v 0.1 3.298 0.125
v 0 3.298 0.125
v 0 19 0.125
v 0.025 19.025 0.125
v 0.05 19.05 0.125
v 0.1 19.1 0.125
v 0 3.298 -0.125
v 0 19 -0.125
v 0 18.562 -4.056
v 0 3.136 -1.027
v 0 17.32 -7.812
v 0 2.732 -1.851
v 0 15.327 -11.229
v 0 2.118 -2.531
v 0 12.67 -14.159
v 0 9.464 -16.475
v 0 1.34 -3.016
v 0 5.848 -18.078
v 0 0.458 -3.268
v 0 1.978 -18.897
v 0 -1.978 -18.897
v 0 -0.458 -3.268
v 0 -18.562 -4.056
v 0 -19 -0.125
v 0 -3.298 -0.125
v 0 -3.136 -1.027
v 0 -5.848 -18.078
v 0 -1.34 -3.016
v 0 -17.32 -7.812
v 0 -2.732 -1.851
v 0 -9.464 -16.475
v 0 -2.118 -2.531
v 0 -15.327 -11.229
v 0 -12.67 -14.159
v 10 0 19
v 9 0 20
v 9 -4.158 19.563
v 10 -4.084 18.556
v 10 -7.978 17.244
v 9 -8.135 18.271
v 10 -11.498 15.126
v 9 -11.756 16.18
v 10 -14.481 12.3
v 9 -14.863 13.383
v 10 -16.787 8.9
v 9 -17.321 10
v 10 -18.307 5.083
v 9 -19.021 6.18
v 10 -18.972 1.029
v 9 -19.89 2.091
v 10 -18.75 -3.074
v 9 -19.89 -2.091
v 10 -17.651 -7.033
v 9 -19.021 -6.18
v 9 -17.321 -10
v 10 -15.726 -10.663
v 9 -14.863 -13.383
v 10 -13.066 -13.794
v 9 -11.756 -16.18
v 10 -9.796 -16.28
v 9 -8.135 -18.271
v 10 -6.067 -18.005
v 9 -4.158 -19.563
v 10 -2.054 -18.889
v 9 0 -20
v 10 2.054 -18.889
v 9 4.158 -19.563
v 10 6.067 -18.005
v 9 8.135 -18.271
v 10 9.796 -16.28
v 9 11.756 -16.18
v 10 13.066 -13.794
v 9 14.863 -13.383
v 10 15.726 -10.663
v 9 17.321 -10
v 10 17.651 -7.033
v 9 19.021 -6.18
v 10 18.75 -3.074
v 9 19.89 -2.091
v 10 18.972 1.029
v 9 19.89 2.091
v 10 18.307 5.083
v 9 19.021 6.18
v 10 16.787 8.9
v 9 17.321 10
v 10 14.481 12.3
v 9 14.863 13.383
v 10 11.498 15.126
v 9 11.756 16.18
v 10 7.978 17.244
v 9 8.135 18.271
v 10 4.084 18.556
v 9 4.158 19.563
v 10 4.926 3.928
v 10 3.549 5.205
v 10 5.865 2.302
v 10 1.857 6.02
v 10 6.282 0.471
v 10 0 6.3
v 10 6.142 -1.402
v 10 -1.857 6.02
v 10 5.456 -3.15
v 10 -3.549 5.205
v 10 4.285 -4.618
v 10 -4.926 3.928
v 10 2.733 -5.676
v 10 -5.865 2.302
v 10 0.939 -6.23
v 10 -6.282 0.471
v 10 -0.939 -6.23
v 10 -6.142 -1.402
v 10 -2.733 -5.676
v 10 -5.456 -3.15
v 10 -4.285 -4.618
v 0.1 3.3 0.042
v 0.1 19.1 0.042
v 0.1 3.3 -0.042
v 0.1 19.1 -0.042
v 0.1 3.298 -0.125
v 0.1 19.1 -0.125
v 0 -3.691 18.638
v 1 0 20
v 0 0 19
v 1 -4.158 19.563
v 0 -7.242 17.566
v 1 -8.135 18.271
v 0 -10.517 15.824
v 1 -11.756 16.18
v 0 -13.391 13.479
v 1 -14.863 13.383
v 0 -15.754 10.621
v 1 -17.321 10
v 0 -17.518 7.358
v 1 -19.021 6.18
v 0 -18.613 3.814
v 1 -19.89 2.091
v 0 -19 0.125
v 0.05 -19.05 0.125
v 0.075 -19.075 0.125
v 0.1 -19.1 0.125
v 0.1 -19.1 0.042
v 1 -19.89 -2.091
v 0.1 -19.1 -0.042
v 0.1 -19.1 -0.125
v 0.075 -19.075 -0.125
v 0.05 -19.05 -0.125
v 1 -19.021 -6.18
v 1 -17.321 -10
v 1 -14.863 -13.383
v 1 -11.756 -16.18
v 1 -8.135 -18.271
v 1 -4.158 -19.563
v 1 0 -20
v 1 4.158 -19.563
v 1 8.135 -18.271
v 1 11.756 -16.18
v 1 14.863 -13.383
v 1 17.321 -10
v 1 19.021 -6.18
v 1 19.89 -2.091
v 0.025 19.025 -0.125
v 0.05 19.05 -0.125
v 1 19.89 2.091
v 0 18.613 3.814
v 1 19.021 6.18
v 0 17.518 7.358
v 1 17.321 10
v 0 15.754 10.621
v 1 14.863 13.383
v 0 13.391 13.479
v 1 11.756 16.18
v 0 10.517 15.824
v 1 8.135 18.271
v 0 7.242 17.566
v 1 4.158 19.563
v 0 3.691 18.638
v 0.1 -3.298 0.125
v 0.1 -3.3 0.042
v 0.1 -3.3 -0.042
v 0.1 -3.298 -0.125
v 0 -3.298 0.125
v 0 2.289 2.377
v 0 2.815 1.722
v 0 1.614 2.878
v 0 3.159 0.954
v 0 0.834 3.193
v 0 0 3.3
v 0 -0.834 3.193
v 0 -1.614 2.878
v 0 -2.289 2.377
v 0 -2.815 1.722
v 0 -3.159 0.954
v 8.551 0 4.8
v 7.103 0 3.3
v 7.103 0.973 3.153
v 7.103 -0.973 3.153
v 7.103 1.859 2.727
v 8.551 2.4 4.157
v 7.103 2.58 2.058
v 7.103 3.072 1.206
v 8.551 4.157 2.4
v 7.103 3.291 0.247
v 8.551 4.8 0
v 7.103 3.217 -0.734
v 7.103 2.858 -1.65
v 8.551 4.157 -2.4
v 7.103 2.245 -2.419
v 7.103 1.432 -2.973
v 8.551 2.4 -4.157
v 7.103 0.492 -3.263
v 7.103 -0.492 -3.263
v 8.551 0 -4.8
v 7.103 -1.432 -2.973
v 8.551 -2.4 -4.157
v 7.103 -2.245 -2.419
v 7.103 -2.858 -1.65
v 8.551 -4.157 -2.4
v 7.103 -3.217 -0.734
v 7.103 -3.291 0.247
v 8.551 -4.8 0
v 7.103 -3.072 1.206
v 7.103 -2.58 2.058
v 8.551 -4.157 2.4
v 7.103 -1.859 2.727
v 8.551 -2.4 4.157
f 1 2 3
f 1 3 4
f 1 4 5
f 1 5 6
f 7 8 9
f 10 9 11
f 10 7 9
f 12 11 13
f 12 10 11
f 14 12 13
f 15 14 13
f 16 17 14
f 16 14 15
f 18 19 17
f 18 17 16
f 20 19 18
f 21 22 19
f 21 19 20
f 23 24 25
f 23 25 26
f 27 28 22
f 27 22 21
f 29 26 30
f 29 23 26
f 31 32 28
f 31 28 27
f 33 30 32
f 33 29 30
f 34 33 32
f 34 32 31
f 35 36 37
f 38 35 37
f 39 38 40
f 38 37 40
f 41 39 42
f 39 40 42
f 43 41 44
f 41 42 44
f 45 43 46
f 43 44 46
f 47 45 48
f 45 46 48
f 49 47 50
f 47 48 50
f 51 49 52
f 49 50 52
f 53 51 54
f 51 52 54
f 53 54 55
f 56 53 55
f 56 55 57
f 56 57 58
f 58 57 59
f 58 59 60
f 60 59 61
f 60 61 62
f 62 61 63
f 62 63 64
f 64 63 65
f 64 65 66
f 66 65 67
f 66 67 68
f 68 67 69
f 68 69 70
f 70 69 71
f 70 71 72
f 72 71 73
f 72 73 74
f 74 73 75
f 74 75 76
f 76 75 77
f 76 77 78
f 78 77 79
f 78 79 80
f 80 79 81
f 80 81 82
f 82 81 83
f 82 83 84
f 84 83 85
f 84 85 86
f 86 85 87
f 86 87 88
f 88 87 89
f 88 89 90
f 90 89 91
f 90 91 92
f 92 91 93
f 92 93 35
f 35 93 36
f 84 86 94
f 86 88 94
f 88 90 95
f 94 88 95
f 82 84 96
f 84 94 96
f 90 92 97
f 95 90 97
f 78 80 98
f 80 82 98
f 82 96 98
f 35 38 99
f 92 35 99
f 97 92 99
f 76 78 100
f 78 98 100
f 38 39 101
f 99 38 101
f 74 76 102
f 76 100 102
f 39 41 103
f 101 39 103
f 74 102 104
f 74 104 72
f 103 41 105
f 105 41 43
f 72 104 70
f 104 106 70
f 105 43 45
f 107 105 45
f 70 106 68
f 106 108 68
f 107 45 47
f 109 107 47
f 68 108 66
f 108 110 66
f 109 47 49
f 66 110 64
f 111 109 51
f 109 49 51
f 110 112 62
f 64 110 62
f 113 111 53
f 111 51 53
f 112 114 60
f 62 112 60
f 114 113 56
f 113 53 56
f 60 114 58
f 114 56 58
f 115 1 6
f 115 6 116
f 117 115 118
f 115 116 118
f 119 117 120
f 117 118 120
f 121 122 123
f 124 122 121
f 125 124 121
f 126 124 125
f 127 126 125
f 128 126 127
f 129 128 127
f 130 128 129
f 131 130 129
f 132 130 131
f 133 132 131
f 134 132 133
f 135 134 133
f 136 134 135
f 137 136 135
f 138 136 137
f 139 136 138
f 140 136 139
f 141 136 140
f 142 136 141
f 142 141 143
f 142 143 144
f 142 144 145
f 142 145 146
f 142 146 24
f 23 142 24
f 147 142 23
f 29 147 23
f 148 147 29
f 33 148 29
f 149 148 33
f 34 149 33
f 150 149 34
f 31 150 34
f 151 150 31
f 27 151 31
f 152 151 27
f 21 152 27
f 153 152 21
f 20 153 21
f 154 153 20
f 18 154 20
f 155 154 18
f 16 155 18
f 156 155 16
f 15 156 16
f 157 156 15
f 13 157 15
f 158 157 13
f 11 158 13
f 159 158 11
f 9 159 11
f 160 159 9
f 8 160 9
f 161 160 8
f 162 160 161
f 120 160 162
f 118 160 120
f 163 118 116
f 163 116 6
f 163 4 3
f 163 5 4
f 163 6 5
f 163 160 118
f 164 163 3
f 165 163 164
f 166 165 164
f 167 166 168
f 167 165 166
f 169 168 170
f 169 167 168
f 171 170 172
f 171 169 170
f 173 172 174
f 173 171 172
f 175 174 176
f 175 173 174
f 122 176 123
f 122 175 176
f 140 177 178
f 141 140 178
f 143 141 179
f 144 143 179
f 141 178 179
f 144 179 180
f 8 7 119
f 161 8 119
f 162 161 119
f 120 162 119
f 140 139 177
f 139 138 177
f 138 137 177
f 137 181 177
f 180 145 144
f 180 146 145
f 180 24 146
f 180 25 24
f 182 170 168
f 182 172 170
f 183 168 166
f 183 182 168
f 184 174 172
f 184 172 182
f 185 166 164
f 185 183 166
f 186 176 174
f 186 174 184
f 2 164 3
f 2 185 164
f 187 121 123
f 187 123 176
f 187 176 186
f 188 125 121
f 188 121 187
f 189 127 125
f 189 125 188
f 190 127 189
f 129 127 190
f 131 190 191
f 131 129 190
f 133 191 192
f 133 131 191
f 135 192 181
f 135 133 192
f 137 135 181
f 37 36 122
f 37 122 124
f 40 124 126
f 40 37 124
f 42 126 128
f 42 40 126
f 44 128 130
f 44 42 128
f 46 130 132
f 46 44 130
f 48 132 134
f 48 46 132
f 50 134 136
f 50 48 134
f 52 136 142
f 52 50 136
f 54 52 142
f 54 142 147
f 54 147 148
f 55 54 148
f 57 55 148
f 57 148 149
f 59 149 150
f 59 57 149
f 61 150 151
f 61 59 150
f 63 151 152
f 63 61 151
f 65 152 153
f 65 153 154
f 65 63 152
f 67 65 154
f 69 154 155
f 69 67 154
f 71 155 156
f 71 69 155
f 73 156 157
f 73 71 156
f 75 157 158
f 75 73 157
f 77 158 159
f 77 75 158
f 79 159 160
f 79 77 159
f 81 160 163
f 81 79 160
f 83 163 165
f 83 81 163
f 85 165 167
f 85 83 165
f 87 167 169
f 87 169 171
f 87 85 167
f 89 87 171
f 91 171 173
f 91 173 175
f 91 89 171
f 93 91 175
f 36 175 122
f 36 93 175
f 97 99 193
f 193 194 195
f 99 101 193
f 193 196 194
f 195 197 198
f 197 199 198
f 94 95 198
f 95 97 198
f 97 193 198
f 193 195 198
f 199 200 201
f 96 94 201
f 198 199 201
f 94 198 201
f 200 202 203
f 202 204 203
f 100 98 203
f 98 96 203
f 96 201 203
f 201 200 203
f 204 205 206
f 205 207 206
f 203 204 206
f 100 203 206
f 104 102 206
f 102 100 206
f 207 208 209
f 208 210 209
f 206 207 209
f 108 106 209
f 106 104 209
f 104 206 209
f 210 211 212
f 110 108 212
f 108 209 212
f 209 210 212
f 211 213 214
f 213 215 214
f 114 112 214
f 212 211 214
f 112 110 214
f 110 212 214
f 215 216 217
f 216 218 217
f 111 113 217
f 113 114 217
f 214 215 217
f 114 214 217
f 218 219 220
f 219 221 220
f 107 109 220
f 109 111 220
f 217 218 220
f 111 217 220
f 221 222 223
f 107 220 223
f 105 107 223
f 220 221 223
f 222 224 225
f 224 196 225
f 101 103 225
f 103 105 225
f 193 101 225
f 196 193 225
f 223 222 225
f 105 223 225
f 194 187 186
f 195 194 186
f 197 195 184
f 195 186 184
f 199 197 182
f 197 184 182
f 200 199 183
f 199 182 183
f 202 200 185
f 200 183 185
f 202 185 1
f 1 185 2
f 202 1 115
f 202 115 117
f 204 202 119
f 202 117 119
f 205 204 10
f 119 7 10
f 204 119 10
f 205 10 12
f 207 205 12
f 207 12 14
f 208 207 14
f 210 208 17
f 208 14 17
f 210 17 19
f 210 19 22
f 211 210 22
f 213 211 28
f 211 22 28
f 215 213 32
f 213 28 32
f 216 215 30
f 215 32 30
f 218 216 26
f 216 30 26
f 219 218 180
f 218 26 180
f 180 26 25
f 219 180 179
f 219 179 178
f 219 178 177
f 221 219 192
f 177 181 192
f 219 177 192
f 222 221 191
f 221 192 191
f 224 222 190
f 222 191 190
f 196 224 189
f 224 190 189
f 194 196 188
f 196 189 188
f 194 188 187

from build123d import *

# Parameters (mm, degrees)
ESQUISSE1_W             = 10
ESQUISSE1_H             = 20
CHANFREIN1_SIZE         = 1
PER_AGE1_D              = 6.6
PER_AGE1_CSINK_D        = 12.6
PER_AGE1_CSINK_ANGLE    = 92
ESQUISSE5_W             = 2.1
ESQUISSE5_H             = 0.25
ENL_V_MAT_EXTRU_1_DEPTH = 20


with BuildPart() as part:
    # Esquisse1 → Base-Révolution (revolve)
    with BuildSketch(Plane.XY, mode=Mode.PRIVATE) as base_r_volution_sk:
        with Locations((5, 10)):
            Rectangle(ESQUISSE1_W, ESQUISSE1_H)
    revolve(base_r_volution_sk.sketch.rotate(Axis((0, 0, 0), (1, 0, 0)), 90), axis=Axis((0, 0, 0), (1, 0, 0)))

    # Chanfrein1
    chanfrein1_edges = [part.edges().sort_by_distance(p)[0] for p in [
        (10, 0, -20),
        (0, 0, -20),
    ]]
    chamfer(chanfrein1_edges, length=CHANFREIN1_SIZE)

    # Perçage1 (through all)
    with Locations(Plane(origin=(10, 0, 0), x_dir=(0, 0, -1), z_dir=(1, 0, 0))):
        with Locations((0, 0)):
            CounterSinkHole(PER_AGE1_D / 2, PER_AGE1_CSINK_D / 2, counter_sink_angle=PER_AGE1_CSINK_ANGLE)

    # Esquisse5 → Enlèv. mat.-Extru.1 (cut, symmetric)
    with BuildSketch(Plane(origin=(0, 0, 0), x_dir=(1, 0, 0), z_dir=(0, 1, 0))):
        with Locations((-0.95, 0)):
            Rectangle(ESQUISSE5_W, ESQUISSE5_H)
    extrude(amount=ENL_V_MAT_EXTRU_1_DEPTH, both=True, mode=Mode.SUBTRACT)


solid = part.part
